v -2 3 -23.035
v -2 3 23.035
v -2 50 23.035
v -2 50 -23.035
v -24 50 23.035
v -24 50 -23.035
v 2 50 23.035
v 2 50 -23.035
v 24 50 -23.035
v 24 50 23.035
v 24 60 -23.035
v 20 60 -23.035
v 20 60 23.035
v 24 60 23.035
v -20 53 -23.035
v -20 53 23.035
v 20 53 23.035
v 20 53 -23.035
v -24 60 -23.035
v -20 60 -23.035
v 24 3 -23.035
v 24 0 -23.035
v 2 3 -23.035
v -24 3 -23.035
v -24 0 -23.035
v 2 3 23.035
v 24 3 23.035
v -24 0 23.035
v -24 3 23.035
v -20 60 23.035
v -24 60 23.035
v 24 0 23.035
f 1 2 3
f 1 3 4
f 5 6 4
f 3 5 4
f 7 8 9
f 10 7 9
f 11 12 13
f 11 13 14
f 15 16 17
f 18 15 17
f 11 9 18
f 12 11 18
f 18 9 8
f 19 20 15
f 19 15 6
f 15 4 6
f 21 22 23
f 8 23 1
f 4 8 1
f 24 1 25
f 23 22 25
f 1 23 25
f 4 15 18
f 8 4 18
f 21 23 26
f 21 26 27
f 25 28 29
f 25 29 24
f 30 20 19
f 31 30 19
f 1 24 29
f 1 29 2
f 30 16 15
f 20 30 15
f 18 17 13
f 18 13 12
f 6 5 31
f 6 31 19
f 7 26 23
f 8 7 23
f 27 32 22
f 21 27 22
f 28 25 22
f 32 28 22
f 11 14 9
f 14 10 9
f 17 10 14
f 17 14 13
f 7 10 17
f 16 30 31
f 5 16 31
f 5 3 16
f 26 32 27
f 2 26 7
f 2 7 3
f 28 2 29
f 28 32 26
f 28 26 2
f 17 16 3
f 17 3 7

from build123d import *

# Parameters (mm, degrees)
IZIM1_W                     = 48
IZIM1_H                     = 46.07
Y_KSEKLIK_EKSTR_ZYON1_DEPTH = 3
IZIM2_W                     = 4
IZIM2_H                     = 46.07
Y_KSEKLIK_EKSTR_ZYON2_DEPTH = 50
IZIM3_W                     = 4
IZIM3_H                     = 46.07
Y_KSEKLIK_EKSTR_ZYON3_DEPTH = 7


with BuildPart() as part:
    # Çizim1 → Yükseklik-Ekstrüzyon1 (new body)
    with BuildSketch(Plane(origin=(0, 0, 0), x_dir=(1, 0, 0), z_dir=(0, 1, 0))):
        Rectangle(IZIM1_W, IZIM1_H)
    y_kseklik_ekstr_zyon1 = extrude(amount=Y_KSEKLIK_EKSTR_ZYON1_DEPTH)

    # Çizim2 → Yükseklik-Ekstrüzyon2 (add)
    with BuildSketch(Plane(origin=(0, 3, 0), x_dir=(1, 0, 0), z_dir=(0, 1, 0))):
        Rectangle(IZIM2_W, IZIM2_H)
    extrude(amount=Y_KSEKLIK_EKSTR_ZYON2_DEPTH)

    # Aynalama1: Yükseklik-Ekstrüzyon1 across plane
    add(y_kseklik_ekstr_zyon1.mirror(Plane.ZX.offset(26.5)))

    # Çizim3 → Yükseklik-Ekstrüzyon3 (add)
    with BuildSketch(Plane(origin=(0, 53, 0), x_dir=(1, 0, 0), z_dir=(0, 1, 0))):
        with Locations((22, 0)):
            Rectangle(IZIM3_W, IZIM3_H)
    y_kseklik_ekstr_zyon3 = extrude(amount=Y_KSEKLIK_EKSTR_ZYON3_DEPTH)

    # Aynalama2: Yükseklik-Ekstrüzyon3 across plane
    add(y_kseklik_ekstr_zyon3.mirror(Plane(origin=(0, 0, 0), x_dir=(0, 0, 1), z_dir=(1, 0, 0))))


solid = part.part
